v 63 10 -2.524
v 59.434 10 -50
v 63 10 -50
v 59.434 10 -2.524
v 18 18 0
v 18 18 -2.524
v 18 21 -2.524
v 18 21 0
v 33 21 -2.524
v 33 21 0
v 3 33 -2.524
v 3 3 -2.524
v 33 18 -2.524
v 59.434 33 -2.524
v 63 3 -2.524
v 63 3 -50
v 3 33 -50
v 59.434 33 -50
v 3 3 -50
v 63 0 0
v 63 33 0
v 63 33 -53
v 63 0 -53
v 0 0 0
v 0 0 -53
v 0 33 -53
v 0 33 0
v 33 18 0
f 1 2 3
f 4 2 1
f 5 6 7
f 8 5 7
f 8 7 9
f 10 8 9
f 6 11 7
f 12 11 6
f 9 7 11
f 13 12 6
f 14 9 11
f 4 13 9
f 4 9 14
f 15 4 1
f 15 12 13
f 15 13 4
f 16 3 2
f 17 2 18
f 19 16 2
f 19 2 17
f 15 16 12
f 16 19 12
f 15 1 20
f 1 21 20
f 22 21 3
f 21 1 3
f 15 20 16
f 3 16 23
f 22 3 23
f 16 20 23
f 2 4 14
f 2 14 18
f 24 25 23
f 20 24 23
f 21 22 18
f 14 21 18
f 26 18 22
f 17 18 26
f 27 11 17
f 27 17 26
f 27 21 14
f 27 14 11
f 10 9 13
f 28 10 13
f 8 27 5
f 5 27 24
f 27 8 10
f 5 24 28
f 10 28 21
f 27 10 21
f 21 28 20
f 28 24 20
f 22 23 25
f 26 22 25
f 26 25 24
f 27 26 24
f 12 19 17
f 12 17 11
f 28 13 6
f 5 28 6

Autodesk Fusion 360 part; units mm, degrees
sketch "Dugnas" plane through (0, 0, 0) normal (0, 1, 0) x (1, 0, 0)
  line L0 (0, 0) -> (63, 0)
  line L1 (63, 0) -> (63, 53)
  line L2 (63, 53) -> (0, 53)
  line L3 (0, 53) -> (0, 0)
  dimension "d1" = 53
  dimension "d2" = 63
extrude "Extrude1" add sketch "Dugnas" along normal blind 3
sketch "Sienos" plane through (0, 3, 0) normal (0, 1, 0) x (-1, 0, 0)
  line L0 (0, -53) -> (0, 0)
  line L1 (0, 0) -> (-63, 0)
  line L2 (-63, 0) -> (-63, -53)
  line L3 (-63, -53) -> (0, -53)
  line L4 (0, 0) -> (-63, -53) construction
  line L5 (0, -53) -> (-63, 0) construction
  line L6 (-3, -2.5238) -> (-59.434, -2.5238)
  line L7 (-59.434, -2.5238) -> (-59.434, -50)
  line L8 (-59.434, -50) -> (-3, -50)
  line L9 (-3, -50) -> (-3, -2.5238)
  dimension "d5" = 3
  dimension "d6" = 3
extrude "Extrude4" add sketch "Sienos" along normal blind 30
sketch "USBC" plane through (59.434, 0, 0) normal (-1, 0, 0) x (0, 0, 1)
  line L0 (-50, 3) -> (-2.5238, 3)
  line L1 (-2.5238, 3) -> (-2.5238, 33)
  line L2 (-2.5238, 33) -> (-50, 33)
  line L3 (-50, 33) -> (-50, 3)
  line L4 (-50, 10) -> (0, 10)
  line L5 (-2.5238, 3) -> (-50, 3)
  dimension "d13" = 7
extrude "Extrude5" cut sketch "USBC" against normal blind 11 contours L0 L1 L3 L4 L5
sketch "LED" plane through (0, 0, -2.5238) normal (0, 0, -1) x (-1, 0, 0)
  line L0 (-63, 3) -> (-3, 3)
  line L1 (-3, 3) -> (-3, 33)
  line L2 (-3, 33) -> (-59.434, 33)
  line L3 (-59.434, 33) -> (-59.434, 10)
  line L4 (-59.434, 10) -> (-63, 10)
  line L5 (-63, 10) -> (-63, 3)
  line L6 (-18, 21) -> (-33, 21)
  line L7 (-33, 21) -> (-33, 18)
  line L8 (-33, 18) -> (-18, 18)
  line L9 (-18, 18) -> (-18, 21)
  line L10 (-3, 3) -> (-59.434, 3)
  point P0 (-63, 3)
  dimension "d16" = 15
  dimension "d17" = 3
  dimension "d18" = 30
  dimension "d19" = 15
extrude "Extrude6" cut sketch "LED" against normal blind 31 contours L6 L7 L8 L9
